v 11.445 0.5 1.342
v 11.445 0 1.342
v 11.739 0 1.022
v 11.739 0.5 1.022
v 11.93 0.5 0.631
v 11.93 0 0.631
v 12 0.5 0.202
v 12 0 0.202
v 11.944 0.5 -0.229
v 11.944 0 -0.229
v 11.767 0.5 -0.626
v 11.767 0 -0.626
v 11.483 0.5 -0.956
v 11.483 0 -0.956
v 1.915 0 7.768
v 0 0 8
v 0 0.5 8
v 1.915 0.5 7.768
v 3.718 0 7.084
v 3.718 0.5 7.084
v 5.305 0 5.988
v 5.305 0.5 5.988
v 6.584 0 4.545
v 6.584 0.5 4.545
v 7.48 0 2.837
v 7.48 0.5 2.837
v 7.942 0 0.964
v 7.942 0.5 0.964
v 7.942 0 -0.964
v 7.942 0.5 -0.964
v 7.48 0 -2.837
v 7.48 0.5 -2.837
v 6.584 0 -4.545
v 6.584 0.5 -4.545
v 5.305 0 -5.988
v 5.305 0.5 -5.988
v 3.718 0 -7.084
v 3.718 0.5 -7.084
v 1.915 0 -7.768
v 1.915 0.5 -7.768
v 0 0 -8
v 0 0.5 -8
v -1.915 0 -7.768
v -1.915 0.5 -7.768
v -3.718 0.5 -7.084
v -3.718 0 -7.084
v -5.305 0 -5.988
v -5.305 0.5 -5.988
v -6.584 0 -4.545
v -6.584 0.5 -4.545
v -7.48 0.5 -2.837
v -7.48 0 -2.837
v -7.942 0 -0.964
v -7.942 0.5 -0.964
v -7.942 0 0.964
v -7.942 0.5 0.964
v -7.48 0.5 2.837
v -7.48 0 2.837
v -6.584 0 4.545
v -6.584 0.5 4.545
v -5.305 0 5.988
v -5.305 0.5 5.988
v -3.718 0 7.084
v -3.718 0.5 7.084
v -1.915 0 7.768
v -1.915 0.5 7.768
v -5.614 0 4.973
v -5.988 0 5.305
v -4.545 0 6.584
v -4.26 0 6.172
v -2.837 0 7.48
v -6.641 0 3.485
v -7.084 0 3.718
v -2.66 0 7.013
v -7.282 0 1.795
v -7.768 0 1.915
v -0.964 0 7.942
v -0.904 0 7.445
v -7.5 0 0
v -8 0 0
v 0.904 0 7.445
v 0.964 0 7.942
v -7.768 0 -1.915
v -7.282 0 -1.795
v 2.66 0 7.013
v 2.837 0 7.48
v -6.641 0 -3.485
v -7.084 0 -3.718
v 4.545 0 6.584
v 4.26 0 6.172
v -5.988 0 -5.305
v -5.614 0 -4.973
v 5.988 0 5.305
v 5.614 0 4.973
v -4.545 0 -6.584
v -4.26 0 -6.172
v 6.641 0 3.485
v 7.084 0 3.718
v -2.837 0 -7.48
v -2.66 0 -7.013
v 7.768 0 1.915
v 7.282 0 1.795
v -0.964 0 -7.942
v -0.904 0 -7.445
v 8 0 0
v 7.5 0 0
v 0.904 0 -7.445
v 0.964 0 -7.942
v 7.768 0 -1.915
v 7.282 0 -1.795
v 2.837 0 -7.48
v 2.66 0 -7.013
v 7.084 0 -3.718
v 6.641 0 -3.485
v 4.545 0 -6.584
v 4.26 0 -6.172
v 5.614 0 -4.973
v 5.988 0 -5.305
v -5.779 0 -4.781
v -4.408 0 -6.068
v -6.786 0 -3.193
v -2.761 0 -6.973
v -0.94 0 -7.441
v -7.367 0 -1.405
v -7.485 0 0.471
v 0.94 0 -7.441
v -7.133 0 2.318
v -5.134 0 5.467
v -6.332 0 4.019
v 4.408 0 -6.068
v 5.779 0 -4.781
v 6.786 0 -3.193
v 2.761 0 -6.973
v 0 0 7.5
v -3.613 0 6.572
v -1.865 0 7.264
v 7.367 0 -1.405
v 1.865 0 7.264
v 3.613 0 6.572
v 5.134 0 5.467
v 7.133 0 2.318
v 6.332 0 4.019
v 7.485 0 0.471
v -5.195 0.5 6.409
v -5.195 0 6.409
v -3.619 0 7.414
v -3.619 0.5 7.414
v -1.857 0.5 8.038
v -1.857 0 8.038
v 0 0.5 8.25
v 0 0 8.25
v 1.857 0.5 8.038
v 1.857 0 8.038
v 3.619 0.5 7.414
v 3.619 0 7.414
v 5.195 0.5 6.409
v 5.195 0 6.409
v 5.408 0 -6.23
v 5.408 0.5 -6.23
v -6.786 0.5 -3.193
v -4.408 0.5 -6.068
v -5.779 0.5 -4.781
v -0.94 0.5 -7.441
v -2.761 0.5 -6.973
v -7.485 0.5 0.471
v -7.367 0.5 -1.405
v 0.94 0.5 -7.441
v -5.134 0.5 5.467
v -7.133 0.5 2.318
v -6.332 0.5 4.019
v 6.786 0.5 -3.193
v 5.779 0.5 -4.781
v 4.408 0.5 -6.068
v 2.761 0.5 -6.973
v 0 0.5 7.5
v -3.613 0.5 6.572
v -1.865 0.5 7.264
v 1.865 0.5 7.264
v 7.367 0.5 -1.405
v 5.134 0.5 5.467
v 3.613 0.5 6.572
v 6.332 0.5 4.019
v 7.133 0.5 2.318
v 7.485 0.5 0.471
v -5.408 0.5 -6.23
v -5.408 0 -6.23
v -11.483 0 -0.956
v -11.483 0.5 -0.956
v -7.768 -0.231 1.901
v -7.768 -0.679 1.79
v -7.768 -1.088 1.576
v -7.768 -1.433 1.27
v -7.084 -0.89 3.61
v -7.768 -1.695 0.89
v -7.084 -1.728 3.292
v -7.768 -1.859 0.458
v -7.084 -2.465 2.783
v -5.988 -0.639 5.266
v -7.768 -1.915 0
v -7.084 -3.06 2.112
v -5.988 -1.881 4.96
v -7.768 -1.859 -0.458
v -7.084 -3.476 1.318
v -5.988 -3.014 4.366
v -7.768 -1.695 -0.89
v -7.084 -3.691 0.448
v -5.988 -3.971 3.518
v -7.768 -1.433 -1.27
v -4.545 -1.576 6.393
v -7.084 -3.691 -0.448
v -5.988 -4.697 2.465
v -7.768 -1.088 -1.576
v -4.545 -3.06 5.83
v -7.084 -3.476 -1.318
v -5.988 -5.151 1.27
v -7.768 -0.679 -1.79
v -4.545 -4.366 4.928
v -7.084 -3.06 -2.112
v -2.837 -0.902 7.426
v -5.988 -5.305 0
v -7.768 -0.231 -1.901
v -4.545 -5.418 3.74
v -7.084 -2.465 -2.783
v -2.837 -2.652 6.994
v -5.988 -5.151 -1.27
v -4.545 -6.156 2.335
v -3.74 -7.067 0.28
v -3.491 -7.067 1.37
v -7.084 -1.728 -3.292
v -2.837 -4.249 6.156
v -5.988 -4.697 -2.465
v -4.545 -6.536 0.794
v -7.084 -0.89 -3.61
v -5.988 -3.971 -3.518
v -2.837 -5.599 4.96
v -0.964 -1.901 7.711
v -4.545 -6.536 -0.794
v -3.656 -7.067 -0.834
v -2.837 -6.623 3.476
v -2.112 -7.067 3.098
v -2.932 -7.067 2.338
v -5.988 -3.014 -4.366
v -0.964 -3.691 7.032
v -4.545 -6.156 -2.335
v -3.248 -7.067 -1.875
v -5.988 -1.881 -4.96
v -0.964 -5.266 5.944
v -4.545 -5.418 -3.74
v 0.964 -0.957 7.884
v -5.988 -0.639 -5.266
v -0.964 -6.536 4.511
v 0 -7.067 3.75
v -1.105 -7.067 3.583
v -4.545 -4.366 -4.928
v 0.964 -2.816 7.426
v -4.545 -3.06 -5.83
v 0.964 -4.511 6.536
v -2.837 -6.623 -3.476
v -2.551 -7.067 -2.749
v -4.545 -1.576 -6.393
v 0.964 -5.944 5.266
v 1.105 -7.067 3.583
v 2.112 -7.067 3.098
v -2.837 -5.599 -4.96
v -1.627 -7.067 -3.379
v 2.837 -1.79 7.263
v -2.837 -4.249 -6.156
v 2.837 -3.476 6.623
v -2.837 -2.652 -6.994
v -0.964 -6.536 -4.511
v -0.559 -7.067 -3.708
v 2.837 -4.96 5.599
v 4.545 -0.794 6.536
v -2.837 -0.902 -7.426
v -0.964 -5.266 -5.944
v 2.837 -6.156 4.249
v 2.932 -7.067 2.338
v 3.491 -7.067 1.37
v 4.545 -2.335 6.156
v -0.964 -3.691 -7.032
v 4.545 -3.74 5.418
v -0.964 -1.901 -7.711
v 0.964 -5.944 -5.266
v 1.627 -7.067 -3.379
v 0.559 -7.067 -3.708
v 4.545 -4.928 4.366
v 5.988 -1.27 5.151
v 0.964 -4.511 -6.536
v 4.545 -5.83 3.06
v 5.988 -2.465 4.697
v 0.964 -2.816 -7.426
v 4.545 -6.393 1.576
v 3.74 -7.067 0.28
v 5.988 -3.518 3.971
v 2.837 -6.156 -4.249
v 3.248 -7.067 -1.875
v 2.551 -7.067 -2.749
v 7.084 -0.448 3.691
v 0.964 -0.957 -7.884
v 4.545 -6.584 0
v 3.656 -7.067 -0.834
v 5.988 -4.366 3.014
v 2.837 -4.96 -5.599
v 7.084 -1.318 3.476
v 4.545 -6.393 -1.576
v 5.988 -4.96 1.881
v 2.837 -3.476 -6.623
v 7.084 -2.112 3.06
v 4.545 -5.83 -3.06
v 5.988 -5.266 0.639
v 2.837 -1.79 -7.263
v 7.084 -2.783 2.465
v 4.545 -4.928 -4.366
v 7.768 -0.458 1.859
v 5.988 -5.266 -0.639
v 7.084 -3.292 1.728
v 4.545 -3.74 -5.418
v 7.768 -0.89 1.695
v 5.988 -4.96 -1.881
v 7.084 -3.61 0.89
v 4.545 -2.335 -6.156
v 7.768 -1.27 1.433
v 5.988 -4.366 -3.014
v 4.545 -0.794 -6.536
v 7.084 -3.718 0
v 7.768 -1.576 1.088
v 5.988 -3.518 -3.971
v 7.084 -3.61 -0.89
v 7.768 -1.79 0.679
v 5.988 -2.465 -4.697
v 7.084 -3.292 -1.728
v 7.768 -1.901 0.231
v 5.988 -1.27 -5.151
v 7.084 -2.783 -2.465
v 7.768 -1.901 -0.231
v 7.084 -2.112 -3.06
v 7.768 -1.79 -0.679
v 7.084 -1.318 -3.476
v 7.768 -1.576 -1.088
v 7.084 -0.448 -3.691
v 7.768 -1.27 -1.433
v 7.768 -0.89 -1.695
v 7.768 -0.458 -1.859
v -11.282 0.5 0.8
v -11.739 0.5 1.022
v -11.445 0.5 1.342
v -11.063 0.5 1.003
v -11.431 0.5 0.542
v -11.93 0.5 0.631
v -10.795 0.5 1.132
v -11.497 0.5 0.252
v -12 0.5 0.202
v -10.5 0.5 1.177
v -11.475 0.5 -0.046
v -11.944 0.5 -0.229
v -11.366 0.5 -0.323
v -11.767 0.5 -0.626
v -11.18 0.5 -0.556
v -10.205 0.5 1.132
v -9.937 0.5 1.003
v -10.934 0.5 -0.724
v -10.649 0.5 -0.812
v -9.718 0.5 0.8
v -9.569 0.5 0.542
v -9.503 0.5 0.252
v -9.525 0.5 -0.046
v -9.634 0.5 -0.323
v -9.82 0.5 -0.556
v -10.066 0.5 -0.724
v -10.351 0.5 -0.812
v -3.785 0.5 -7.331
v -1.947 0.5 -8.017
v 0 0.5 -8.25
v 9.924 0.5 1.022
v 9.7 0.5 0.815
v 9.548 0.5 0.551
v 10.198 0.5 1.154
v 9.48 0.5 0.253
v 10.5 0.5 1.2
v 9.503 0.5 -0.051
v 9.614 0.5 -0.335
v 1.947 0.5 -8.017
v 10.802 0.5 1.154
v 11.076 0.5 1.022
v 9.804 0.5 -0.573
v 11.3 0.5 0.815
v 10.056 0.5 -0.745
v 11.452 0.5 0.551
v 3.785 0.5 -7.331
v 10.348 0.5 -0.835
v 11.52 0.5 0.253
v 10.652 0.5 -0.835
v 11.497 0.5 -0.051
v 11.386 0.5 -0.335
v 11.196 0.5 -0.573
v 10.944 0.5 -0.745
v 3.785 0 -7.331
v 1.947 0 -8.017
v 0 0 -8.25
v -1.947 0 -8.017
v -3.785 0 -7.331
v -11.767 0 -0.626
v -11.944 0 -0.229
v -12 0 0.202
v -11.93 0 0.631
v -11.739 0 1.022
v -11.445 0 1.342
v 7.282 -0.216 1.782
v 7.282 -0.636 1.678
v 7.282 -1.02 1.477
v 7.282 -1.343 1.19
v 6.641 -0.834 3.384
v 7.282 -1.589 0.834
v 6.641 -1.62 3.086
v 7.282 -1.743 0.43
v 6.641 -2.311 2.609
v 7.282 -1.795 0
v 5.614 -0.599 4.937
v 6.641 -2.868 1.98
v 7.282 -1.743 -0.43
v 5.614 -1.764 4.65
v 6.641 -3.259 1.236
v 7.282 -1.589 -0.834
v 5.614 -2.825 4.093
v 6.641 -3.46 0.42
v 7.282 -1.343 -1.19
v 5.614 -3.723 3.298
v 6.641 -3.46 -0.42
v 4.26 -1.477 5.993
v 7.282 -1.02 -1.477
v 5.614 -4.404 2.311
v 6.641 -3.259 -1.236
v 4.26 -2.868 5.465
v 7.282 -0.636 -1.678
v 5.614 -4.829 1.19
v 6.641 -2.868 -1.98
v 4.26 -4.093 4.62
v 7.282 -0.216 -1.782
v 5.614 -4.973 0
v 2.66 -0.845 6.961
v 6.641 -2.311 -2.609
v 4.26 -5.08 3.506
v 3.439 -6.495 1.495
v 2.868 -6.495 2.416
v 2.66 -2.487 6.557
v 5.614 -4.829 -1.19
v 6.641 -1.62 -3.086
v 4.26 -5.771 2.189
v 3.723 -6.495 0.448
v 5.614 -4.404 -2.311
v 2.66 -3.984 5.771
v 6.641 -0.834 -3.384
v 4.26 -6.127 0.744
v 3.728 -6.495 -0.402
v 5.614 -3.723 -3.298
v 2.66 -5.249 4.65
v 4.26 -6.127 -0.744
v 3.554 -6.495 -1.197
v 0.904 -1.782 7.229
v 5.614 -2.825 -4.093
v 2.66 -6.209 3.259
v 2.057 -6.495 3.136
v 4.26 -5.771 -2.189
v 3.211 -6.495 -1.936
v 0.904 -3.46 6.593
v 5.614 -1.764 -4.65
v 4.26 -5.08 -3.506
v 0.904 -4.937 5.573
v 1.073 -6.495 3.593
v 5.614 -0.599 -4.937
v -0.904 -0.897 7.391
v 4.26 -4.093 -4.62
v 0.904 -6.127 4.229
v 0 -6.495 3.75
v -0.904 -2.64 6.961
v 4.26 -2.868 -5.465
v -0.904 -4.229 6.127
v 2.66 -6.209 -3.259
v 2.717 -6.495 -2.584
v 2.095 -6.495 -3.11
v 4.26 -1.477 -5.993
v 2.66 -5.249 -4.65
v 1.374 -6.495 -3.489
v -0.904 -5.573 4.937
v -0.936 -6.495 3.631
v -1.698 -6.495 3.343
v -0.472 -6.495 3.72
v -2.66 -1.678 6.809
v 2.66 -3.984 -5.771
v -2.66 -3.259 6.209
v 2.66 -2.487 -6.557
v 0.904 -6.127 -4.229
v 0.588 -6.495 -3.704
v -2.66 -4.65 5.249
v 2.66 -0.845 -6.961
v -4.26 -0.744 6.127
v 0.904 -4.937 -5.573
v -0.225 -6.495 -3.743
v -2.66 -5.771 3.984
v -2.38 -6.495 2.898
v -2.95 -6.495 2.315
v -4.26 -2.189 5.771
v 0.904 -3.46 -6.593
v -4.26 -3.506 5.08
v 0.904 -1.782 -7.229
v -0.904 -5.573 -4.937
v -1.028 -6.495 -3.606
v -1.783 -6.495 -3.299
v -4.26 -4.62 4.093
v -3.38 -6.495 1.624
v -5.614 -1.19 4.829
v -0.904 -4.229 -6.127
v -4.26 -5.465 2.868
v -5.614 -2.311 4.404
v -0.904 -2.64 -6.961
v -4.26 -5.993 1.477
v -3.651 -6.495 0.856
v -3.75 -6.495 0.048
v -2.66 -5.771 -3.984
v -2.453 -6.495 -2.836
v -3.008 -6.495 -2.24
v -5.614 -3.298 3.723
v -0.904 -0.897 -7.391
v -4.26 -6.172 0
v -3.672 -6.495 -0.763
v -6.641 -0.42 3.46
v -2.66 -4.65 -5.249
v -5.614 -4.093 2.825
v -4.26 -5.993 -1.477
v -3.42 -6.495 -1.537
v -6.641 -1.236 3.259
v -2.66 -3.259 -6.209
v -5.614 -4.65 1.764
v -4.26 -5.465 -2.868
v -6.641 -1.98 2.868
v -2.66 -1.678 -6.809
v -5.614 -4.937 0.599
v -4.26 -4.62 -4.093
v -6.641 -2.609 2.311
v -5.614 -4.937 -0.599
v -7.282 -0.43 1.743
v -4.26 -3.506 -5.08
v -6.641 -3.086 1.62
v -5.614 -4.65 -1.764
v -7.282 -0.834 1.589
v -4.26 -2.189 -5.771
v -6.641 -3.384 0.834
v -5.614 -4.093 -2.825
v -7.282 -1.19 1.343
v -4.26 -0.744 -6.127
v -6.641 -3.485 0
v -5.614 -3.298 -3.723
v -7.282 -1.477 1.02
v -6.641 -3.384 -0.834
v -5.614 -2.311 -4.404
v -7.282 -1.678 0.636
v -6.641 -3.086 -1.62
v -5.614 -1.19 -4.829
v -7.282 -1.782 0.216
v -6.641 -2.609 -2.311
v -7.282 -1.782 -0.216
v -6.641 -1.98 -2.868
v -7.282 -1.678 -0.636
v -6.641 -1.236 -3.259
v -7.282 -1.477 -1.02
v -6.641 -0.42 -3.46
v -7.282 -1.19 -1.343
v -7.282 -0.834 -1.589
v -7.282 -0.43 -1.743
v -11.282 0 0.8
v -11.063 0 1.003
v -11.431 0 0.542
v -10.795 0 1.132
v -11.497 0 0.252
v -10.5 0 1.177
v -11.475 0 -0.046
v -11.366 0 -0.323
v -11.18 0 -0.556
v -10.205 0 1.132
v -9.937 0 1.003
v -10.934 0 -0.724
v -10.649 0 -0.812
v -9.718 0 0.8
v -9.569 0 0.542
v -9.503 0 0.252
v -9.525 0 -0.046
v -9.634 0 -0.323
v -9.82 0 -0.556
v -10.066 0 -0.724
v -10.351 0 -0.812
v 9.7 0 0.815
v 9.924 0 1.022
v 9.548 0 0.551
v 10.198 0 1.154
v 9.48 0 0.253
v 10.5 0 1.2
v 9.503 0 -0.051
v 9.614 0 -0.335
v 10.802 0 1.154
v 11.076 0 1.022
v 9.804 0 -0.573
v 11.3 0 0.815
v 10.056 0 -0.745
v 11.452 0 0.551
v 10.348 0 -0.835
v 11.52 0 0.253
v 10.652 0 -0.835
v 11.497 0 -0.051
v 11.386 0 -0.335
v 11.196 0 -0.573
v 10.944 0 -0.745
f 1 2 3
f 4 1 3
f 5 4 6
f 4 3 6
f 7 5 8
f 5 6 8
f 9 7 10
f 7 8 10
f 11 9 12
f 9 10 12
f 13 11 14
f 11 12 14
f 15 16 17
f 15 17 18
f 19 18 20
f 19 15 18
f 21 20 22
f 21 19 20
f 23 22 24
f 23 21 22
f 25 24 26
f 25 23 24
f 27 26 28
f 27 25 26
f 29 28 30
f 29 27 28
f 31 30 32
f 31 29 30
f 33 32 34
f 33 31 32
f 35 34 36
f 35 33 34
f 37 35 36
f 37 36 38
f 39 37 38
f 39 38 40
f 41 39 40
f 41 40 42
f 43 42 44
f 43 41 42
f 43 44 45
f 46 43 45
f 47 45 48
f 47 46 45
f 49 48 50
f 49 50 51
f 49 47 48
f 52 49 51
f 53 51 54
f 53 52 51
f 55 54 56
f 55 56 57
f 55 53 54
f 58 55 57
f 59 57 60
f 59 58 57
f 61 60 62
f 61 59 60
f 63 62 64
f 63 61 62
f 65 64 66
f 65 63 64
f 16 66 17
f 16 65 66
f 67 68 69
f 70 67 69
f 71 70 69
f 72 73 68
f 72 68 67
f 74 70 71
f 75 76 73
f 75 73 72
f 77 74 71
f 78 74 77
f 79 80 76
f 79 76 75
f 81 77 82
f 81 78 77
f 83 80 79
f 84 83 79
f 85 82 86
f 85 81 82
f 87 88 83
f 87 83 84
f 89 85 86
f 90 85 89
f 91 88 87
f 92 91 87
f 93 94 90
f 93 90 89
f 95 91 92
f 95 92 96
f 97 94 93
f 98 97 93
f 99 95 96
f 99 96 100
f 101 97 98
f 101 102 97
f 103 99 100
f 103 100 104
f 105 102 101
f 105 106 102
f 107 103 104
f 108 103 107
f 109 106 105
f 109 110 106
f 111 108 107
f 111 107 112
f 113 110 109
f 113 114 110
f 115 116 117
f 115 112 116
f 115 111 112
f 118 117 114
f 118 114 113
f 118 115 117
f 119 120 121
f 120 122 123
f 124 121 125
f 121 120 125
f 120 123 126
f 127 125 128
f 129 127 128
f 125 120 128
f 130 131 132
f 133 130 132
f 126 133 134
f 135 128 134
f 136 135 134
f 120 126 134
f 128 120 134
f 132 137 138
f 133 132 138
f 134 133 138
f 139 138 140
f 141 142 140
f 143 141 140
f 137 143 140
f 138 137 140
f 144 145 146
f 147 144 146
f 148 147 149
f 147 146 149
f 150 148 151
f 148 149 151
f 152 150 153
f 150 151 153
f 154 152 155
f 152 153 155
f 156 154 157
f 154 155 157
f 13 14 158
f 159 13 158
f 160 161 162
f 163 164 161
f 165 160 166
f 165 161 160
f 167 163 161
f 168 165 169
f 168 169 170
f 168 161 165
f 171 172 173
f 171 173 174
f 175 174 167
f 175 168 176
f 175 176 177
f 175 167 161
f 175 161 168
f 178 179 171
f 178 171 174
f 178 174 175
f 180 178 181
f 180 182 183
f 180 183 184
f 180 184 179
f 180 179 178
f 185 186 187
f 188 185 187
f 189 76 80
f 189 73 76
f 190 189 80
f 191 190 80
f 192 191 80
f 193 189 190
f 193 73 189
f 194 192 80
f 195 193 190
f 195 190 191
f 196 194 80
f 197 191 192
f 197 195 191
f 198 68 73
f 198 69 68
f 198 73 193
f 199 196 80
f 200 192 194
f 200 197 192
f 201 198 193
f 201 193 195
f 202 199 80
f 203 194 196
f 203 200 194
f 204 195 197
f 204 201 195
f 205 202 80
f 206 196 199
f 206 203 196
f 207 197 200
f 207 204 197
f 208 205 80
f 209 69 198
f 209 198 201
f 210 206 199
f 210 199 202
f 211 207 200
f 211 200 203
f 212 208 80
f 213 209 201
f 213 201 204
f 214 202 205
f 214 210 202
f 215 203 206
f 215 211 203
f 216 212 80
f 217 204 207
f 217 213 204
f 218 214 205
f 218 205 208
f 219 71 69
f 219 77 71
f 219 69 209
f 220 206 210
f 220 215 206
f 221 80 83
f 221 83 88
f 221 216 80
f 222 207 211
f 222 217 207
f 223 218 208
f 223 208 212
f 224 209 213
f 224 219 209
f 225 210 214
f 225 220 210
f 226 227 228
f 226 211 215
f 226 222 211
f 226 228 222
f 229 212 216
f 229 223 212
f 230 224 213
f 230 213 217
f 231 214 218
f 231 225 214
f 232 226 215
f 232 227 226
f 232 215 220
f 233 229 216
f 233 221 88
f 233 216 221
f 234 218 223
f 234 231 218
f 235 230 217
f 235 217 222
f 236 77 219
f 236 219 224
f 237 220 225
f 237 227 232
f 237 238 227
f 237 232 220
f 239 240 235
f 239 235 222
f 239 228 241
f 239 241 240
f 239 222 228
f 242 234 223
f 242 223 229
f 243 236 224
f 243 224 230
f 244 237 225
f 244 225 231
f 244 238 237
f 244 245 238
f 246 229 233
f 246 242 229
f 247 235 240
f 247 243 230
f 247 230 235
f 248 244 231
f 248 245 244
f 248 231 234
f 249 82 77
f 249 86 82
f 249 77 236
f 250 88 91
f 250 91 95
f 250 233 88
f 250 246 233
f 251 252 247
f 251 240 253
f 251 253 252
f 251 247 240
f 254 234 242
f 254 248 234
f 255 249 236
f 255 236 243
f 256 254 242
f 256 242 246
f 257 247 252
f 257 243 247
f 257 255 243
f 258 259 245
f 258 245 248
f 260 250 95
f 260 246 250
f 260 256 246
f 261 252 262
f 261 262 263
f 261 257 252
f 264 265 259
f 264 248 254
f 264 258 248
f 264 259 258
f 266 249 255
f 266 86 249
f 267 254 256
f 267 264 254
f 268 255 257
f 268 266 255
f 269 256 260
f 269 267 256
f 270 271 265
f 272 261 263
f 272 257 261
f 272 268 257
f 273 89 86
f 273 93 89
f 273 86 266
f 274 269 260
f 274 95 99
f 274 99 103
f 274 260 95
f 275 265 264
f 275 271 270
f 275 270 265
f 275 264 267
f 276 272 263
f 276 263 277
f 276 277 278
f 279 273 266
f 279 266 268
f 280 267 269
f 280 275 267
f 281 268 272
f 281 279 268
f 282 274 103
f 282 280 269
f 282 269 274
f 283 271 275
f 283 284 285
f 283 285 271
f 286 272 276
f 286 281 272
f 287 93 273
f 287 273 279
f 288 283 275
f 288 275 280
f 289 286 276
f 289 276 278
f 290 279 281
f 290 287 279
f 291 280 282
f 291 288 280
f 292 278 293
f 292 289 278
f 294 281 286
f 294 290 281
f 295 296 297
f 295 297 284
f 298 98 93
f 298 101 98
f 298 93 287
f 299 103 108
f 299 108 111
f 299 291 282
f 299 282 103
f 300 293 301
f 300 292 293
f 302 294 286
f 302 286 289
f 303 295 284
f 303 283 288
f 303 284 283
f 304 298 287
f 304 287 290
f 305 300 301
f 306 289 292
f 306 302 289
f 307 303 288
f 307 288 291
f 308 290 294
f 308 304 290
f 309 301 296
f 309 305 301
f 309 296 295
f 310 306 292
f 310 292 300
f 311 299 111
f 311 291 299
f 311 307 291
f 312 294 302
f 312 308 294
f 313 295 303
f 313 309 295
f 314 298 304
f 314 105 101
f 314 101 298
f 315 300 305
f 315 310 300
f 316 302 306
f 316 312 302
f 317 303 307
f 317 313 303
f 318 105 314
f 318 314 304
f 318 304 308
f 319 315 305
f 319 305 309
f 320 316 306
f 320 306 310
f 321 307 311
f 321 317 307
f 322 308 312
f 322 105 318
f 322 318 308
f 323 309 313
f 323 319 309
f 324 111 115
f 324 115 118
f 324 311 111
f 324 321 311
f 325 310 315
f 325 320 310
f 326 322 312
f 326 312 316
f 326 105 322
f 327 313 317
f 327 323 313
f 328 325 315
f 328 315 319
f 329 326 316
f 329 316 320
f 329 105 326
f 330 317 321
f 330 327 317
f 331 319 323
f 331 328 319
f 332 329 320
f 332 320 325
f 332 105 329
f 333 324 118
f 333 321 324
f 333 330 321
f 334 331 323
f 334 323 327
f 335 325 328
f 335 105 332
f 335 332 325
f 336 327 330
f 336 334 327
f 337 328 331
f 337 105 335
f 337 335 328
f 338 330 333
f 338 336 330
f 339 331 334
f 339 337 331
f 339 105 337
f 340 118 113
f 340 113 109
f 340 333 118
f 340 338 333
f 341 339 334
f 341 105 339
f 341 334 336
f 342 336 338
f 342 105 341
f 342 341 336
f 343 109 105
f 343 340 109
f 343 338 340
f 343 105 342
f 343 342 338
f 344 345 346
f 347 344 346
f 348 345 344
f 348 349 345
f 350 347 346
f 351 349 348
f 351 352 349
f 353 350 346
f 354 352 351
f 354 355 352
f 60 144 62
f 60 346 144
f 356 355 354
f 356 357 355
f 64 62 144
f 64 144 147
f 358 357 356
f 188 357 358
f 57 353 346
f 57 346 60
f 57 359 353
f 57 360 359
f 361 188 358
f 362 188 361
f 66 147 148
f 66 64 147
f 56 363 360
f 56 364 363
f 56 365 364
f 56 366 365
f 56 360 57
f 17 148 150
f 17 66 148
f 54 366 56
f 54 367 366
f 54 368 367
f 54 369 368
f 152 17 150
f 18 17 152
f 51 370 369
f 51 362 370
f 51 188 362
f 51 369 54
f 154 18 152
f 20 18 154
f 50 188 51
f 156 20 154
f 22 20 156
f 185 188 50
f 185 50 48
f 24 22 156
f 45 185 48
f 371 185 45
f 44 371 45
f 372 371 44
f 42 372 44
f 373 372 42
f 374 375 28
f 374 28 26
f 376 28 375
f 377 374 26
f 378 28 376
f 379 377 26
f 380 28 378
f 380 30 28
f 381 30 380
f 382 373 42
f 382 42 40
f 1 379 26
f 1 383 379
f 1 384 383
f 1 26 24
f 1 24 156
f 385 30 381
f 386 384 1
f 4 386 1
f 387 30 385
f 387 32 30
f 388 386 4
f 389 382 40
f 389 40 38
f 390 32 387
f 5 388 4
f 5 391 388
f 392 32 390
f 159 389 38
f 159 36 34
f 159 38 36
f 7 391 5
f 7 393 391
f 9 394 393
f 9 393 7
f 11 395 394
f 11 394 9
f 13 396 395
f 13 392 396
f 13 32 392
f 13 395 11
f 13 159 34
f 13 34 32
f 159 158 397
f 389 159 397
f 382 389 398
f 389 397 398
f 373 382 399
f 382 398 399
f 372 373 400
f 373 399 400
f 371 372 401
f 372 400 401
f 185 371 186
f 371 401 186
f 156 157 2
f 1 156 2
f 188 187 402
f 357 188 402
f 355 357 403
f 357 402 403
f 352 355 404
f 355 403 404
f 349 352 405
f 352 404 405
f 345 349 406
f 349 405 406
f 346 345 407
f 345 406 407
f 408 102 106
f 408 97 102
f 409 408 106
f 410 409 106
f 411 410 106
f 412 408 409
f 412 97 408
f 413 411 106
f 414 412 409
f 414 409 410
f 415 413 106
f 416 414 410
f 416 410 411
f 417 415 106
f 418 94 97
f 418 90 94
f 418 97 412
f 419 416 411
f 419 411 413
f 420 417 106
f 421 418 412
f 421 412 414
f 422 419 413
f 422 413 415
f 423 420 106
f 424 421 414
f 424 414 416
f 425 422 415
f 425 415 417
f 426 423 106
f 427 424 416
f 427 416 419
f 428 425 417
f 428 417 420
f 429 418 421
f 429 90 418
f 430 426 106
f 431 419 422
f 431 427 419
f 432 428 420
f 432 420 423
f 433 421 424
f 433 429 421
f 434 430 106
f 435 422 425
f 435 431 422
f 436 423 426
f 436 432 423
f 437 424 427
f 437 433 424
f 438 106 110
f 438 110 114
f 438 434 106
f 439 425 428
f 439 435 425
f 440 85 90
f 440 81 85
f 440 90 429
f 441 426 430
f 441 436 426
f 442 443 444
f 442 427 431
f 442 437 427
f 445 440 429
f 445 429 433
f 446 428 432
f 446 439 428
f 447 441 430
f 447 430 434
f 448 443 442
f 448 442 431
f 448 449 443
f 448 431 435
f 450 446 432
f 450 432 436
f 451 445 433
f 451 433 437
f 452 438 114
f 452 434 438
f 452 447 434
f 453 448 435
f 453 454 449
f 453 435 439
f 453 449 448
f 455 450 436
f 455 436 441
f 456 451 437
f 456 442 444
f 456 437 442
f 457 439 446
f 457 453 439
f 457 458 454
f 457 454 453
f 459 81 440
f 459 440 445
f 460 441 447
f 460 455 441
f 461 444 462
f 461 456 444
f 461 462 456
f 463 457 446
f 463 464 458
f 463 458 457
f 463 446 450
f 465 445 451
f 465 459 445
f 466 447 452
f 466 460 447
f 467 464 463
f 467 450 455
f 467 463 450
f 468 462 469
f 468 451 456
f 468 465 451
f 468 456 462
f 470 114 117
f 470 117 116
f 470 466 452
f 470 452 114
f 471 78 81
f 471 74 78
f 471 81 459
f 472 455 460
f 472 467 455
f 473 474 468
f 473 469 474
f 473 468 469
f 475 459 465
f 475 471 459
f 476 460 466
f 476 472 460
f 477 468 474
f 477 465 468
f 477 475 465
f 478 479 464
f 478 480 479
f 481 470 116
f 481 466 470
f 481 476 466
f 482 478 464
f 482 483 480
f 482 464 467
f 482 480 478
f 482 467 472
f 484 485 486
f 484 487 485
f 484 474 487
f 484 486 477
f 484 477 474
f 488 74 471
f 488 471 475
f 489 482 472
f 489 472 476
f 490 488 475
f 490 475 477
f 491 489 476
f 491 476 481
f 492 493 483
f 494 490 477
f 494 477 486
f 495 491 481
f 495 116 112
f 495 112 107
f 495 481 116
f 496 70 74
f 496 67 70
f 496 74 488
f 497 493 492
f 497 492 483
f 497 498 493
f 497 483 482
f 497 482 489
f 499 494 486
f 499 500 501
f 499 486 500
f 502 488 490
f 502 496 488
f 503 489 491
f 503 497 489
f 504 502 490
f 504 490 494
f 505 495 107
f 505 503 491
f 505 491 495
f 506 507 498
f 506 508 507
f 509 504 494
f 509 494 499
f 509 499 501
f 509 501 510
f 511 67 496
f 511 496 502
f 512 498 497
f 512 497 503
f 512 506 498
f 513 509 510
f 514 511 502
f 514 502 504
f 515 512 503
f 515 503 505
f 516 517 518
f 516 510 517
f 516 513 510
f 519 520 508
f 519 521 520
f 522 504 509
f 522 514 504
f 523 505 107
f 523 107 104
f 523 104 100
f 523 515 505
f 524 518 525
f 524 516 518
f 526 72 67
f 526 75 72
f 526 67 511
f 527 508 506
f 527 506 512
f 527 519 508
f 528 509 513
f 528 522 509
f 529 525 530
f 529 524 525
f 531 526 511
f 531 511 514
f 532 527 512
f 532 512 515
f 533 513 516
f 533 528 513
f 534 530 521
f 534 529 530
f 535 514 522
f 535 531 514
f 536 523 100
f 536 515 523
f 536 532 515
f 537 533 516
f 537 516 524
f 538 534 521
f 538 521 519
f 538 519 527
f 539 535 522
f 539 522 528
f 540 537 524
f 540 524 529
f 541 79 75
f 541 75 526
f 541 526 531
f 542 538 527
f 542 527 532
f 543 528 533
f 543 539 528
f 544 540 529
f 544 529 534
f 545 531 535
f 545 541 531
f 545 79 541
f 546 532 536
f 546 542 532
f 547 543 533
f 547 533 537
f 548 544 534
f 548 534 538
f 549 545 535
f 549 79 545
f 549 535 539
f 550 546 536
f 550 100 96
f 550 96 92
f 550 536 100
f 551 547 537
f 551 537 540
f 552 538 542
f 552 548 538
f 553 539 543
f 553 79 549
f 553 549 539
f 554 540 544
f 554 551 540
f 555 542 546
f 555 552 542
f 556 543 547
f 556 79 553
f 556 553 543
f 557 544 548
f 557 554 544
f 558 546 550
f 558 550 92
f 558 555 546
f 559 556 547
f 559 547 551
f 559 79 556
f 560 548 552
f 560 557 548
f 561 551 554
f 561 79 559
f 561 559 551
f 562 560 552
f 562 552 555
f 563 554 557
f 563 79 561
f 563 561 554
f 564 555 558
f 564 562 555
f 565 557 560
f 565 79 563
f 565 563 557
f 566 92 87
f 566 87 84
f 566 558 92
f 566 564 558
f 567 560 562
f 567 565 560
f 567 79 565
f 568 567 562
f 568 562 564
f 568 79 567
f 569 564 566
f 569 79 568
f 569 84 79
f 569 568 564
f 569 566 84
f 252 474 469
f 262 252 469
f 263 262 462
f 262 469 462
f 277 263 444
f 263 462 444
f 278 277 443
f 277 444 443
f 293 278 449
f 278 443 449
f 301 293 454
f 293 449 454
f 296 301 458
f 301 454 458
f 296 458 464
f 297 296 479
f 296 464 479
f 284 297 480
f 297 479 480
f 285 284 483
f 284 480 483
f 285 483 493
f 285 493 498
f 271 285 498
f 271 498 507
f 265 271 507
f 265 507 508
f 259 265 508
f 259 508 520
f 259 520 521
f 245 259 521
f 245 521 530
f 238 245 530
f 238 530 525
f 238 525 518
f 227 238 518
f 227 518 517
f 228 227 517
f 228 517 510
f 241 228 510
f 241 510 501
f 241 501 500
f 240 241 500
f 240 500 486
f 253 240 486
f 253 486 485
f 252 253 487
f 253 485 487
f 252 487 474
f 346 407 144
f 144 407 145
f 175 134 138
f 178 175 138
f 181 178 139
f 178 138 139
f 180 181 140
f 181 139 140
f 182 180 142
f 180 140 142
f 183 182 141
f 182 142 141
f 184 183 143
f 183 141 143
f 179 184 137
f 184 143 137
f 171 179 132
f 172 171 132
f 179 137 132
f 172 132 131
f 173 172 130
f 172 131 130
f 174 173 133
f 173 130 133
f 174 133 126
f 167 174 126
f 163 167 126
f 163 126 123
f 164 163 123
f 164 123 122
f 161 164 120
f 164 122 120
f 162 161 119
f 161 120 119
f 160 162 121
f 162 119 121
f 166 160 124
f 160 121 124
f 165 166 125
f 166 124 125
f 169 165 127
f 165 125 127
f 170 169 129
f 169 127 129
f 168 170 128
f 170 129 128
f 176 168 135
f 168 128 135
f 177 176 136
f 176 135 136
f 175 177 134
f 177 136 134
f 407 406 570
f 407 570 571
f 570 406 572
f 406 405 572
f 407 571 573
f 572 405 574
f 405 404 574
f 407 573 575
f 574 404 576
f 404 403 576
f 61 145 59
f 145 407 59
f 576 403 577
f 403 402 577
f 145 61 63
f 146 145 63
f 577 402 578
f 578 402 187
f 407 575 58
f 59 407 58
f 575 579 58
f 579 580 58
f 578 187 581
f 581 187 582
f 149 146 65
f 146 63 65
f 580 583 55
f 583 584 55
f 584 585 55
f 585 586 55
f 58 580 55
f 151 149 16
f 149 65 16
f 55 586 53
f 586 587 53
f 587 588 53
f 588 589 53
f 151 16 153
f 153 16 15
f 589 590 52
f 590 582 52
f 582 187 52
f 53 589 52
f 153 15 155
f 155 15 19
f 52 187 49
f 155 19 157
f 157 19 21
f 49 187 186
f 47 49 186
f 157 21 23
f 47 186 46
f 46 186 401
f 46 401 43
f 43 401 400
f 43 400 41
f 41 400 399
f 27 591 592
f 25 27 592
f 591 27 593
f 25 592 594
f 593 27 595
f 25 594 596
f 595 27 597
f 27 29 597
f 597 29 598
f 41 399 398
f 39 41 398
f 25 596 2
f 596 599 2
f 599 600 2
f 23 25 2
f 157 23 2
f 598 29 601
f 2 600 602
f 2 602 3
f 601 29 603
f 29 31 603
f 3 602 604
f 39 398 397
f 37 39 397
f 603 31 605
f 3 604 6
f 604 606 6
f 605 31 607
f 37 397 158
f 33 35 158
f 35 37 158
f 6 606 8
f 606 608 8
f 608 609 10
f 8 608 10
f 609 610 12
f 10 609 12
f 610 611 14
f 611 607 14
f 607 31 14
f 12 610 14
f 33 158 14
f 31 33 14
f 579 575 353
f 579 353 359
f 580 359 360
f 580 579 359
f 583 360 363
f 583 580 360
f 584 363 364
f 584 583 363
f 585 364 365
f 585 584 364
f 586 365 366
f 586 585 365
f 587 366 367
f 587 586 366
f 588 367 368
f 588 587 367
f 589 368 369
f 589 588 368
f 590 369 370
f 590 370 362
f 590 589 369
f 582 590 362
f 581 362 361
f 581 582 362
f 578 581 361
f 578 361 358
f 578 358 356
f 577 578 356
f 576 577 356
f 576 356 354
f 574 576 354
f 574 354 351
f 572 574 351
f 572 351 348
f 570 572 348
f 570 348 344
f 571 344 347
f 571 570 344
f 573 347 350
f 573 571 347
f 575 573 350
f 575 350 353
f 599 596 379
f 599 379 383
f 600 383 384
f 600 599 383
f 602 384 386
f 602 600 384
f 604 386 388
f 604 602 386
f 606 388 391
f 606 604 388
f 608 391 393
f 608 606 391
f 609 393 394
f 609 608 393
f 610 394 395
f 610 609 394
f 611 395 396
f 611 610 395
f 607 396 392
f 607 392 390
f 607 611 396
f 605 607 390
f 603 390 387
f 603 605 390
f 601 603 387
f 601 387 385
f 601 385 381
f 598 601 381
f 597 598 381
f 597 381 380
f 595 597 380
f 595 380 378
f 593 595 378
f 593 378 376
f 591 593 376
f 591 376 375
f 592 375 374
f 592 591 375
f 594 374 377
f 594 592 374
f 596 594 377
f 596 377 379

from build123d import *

# Parameters (mm, degrees)
REVOLVE6_ANGLE          = 180
SKETCH1_9_R             = 2
BOSS_EXTRUDE1_DEPTH     = 1
SKETCH1_9_R_2           = 15
BOSS_EXTRUDE1_2_DEPTH   = 1
CUT_EXTRUDE1_REACH      = 35.231
CUT_EXTRUDE1_END_RADIUS = 16
SKETCH2_R               = 7.5
SCALE2_SCALE            = 0.5


with BuildPart() as part:
    # Sketch1 → Revolve6 (revolve)
    with BuildSketch(Plane(origin=(0, 0, 0), x_dir=(1, 0, 0), z_dir=(0, 1, 0))):
        with BuildLine():
            ThreePointArc((-16, 0), (0, -16), (16, 0))
            Line((16, 0), (15, 0))
            ThreePointArc((15, 0), (0, -15), (-15, 0))
            Line((-15, 0), (-16, 0))
        make_face()
    revolve(axis=Axis((-19.031531421, 0, 0), (1, 0, 0)), revolution_arc=REVOLVE6_ANGLE)

    # Cut-Extrude1: up to this sphere (the profile starts inside it)
    cut_extrude1_end = Location((0, 0, 0)) * Sphere(CUT_EXTRUDE1_END_RADIUS, mode=Mode.PRIVATE)
    # Sketch2 → Cut-Extrude1 (cut, up to the surface)
    with BuildSketch(Plane(origin=(0, 0, 0), x_dir=(1, 0, 0), z_dir=(0, 1, 0)), mode=Mode.PRIVATE) as cut_extrude1_sk1:
        Circle(SKETCH2_R)
    cut_extrude1_tool1 = extrude(cut_extrude1_sk1.sketch, amount=-CUT_EXTRUDE1_REACH, mode=Mode.PRIVATE) & cut_extrude1_end
    add(cut_extrude1_tool1.solids().sort_by_distance((0, 0, 0))[0], mode=Mode.SUBTRACT)


with BuildPart() as body_2:
    # Sketch1_9 → Boss-Extrude1 (new body)
    with BuildSketch(Plane(origin=(0, 0, 0), x_dir=(1, 0, 0), z_dir=(0, 1, 0))):
        with BuildLine():
            ThreePointArc((-22.96695029, 1.912018961), (-24, -0.404273426), (-22.889523883, -2.684458707))
            Line((-22.889523883, -2.684458707), (-10.390907276, -12.81713876))
            ThreePointArc((-10.390907276, -12.81713876), (0, -16.5), (10.390907276, -12.81713876))
            Line((10.390907276, -12.81713876), (22.889523883, -2.684458707))
            ThreePointArc((22.889523883, -2.684458707), (23.780005188, -1.48251064), (23.979500335, 0))
            ThreePointArc((23.979500335, 0), (23.651565118, 1.050453093), (22.96695029, 1.912018961))
            Line((22.96695029, 1.912018961), (10.816692113, 12.459902557))
            ThreePointArc((10.816692113, 12.459902557), (0, 16.5), (-10.816692113, 12.459902557))
            Line((-10.816692113, 12.459902557), (-22.96695029, 1.912018961))
        make_face()
        with Locations((-21, -0.353739248)):
            Circle(SKETCH1_9_R, mode=Mode.SUBTRACT)
        with BuildLine():
            ThreePointArc((18.984689587, 0), (21, 1.692380865), (23.015310413, 0))
            ThreePointArc((23.015310413, 0), (21, -2.39985936), (18.984689587, 0))
        make_face(mode=Mode.SUBTRACT)
        with BuildLine():
            ThreePointArc((-16, 0), (0, 16), (16, 0))
            ThreePointArc((16, 0), (0, -16), (-16, 0))
        make_face(mode=Mode.SUBTRACT)
    extrude(amount=BOSS_EXTRUDE1_DEPTH)


with BuildPart() as body_3:
    # Sketch1_9 → Boss-Extrude1 2 (new body)
    with BuildSketch(Plane(origin=(0, 0, 0), x_dir=(1, 0, 0), z_dir=(0, 1, 0))):
        Circle(SKETCH1_9_R_2)
    extrude(amount=BOSS_EXTRUDE1_2_DEPTH)


with BuildPart() as body_2_1:
    # Scale2: scaled about (0, 0, 0)
    add(body_2.part.scale(SCALE2_SCALE))


with BuildPart() as body_3_1:
    # Scale2: scaled about (0, 0, 0)
    add(body_3.part.scale(SCALE2_SCALE))


with BuildPart() as part_1:
    # Scale2: scaled about (0, 0, 0)
    add(part.part.scale(SCALE2_SCALE))


solid = Compound([body_2_1.part, body_3_1.part, part_1.part])
